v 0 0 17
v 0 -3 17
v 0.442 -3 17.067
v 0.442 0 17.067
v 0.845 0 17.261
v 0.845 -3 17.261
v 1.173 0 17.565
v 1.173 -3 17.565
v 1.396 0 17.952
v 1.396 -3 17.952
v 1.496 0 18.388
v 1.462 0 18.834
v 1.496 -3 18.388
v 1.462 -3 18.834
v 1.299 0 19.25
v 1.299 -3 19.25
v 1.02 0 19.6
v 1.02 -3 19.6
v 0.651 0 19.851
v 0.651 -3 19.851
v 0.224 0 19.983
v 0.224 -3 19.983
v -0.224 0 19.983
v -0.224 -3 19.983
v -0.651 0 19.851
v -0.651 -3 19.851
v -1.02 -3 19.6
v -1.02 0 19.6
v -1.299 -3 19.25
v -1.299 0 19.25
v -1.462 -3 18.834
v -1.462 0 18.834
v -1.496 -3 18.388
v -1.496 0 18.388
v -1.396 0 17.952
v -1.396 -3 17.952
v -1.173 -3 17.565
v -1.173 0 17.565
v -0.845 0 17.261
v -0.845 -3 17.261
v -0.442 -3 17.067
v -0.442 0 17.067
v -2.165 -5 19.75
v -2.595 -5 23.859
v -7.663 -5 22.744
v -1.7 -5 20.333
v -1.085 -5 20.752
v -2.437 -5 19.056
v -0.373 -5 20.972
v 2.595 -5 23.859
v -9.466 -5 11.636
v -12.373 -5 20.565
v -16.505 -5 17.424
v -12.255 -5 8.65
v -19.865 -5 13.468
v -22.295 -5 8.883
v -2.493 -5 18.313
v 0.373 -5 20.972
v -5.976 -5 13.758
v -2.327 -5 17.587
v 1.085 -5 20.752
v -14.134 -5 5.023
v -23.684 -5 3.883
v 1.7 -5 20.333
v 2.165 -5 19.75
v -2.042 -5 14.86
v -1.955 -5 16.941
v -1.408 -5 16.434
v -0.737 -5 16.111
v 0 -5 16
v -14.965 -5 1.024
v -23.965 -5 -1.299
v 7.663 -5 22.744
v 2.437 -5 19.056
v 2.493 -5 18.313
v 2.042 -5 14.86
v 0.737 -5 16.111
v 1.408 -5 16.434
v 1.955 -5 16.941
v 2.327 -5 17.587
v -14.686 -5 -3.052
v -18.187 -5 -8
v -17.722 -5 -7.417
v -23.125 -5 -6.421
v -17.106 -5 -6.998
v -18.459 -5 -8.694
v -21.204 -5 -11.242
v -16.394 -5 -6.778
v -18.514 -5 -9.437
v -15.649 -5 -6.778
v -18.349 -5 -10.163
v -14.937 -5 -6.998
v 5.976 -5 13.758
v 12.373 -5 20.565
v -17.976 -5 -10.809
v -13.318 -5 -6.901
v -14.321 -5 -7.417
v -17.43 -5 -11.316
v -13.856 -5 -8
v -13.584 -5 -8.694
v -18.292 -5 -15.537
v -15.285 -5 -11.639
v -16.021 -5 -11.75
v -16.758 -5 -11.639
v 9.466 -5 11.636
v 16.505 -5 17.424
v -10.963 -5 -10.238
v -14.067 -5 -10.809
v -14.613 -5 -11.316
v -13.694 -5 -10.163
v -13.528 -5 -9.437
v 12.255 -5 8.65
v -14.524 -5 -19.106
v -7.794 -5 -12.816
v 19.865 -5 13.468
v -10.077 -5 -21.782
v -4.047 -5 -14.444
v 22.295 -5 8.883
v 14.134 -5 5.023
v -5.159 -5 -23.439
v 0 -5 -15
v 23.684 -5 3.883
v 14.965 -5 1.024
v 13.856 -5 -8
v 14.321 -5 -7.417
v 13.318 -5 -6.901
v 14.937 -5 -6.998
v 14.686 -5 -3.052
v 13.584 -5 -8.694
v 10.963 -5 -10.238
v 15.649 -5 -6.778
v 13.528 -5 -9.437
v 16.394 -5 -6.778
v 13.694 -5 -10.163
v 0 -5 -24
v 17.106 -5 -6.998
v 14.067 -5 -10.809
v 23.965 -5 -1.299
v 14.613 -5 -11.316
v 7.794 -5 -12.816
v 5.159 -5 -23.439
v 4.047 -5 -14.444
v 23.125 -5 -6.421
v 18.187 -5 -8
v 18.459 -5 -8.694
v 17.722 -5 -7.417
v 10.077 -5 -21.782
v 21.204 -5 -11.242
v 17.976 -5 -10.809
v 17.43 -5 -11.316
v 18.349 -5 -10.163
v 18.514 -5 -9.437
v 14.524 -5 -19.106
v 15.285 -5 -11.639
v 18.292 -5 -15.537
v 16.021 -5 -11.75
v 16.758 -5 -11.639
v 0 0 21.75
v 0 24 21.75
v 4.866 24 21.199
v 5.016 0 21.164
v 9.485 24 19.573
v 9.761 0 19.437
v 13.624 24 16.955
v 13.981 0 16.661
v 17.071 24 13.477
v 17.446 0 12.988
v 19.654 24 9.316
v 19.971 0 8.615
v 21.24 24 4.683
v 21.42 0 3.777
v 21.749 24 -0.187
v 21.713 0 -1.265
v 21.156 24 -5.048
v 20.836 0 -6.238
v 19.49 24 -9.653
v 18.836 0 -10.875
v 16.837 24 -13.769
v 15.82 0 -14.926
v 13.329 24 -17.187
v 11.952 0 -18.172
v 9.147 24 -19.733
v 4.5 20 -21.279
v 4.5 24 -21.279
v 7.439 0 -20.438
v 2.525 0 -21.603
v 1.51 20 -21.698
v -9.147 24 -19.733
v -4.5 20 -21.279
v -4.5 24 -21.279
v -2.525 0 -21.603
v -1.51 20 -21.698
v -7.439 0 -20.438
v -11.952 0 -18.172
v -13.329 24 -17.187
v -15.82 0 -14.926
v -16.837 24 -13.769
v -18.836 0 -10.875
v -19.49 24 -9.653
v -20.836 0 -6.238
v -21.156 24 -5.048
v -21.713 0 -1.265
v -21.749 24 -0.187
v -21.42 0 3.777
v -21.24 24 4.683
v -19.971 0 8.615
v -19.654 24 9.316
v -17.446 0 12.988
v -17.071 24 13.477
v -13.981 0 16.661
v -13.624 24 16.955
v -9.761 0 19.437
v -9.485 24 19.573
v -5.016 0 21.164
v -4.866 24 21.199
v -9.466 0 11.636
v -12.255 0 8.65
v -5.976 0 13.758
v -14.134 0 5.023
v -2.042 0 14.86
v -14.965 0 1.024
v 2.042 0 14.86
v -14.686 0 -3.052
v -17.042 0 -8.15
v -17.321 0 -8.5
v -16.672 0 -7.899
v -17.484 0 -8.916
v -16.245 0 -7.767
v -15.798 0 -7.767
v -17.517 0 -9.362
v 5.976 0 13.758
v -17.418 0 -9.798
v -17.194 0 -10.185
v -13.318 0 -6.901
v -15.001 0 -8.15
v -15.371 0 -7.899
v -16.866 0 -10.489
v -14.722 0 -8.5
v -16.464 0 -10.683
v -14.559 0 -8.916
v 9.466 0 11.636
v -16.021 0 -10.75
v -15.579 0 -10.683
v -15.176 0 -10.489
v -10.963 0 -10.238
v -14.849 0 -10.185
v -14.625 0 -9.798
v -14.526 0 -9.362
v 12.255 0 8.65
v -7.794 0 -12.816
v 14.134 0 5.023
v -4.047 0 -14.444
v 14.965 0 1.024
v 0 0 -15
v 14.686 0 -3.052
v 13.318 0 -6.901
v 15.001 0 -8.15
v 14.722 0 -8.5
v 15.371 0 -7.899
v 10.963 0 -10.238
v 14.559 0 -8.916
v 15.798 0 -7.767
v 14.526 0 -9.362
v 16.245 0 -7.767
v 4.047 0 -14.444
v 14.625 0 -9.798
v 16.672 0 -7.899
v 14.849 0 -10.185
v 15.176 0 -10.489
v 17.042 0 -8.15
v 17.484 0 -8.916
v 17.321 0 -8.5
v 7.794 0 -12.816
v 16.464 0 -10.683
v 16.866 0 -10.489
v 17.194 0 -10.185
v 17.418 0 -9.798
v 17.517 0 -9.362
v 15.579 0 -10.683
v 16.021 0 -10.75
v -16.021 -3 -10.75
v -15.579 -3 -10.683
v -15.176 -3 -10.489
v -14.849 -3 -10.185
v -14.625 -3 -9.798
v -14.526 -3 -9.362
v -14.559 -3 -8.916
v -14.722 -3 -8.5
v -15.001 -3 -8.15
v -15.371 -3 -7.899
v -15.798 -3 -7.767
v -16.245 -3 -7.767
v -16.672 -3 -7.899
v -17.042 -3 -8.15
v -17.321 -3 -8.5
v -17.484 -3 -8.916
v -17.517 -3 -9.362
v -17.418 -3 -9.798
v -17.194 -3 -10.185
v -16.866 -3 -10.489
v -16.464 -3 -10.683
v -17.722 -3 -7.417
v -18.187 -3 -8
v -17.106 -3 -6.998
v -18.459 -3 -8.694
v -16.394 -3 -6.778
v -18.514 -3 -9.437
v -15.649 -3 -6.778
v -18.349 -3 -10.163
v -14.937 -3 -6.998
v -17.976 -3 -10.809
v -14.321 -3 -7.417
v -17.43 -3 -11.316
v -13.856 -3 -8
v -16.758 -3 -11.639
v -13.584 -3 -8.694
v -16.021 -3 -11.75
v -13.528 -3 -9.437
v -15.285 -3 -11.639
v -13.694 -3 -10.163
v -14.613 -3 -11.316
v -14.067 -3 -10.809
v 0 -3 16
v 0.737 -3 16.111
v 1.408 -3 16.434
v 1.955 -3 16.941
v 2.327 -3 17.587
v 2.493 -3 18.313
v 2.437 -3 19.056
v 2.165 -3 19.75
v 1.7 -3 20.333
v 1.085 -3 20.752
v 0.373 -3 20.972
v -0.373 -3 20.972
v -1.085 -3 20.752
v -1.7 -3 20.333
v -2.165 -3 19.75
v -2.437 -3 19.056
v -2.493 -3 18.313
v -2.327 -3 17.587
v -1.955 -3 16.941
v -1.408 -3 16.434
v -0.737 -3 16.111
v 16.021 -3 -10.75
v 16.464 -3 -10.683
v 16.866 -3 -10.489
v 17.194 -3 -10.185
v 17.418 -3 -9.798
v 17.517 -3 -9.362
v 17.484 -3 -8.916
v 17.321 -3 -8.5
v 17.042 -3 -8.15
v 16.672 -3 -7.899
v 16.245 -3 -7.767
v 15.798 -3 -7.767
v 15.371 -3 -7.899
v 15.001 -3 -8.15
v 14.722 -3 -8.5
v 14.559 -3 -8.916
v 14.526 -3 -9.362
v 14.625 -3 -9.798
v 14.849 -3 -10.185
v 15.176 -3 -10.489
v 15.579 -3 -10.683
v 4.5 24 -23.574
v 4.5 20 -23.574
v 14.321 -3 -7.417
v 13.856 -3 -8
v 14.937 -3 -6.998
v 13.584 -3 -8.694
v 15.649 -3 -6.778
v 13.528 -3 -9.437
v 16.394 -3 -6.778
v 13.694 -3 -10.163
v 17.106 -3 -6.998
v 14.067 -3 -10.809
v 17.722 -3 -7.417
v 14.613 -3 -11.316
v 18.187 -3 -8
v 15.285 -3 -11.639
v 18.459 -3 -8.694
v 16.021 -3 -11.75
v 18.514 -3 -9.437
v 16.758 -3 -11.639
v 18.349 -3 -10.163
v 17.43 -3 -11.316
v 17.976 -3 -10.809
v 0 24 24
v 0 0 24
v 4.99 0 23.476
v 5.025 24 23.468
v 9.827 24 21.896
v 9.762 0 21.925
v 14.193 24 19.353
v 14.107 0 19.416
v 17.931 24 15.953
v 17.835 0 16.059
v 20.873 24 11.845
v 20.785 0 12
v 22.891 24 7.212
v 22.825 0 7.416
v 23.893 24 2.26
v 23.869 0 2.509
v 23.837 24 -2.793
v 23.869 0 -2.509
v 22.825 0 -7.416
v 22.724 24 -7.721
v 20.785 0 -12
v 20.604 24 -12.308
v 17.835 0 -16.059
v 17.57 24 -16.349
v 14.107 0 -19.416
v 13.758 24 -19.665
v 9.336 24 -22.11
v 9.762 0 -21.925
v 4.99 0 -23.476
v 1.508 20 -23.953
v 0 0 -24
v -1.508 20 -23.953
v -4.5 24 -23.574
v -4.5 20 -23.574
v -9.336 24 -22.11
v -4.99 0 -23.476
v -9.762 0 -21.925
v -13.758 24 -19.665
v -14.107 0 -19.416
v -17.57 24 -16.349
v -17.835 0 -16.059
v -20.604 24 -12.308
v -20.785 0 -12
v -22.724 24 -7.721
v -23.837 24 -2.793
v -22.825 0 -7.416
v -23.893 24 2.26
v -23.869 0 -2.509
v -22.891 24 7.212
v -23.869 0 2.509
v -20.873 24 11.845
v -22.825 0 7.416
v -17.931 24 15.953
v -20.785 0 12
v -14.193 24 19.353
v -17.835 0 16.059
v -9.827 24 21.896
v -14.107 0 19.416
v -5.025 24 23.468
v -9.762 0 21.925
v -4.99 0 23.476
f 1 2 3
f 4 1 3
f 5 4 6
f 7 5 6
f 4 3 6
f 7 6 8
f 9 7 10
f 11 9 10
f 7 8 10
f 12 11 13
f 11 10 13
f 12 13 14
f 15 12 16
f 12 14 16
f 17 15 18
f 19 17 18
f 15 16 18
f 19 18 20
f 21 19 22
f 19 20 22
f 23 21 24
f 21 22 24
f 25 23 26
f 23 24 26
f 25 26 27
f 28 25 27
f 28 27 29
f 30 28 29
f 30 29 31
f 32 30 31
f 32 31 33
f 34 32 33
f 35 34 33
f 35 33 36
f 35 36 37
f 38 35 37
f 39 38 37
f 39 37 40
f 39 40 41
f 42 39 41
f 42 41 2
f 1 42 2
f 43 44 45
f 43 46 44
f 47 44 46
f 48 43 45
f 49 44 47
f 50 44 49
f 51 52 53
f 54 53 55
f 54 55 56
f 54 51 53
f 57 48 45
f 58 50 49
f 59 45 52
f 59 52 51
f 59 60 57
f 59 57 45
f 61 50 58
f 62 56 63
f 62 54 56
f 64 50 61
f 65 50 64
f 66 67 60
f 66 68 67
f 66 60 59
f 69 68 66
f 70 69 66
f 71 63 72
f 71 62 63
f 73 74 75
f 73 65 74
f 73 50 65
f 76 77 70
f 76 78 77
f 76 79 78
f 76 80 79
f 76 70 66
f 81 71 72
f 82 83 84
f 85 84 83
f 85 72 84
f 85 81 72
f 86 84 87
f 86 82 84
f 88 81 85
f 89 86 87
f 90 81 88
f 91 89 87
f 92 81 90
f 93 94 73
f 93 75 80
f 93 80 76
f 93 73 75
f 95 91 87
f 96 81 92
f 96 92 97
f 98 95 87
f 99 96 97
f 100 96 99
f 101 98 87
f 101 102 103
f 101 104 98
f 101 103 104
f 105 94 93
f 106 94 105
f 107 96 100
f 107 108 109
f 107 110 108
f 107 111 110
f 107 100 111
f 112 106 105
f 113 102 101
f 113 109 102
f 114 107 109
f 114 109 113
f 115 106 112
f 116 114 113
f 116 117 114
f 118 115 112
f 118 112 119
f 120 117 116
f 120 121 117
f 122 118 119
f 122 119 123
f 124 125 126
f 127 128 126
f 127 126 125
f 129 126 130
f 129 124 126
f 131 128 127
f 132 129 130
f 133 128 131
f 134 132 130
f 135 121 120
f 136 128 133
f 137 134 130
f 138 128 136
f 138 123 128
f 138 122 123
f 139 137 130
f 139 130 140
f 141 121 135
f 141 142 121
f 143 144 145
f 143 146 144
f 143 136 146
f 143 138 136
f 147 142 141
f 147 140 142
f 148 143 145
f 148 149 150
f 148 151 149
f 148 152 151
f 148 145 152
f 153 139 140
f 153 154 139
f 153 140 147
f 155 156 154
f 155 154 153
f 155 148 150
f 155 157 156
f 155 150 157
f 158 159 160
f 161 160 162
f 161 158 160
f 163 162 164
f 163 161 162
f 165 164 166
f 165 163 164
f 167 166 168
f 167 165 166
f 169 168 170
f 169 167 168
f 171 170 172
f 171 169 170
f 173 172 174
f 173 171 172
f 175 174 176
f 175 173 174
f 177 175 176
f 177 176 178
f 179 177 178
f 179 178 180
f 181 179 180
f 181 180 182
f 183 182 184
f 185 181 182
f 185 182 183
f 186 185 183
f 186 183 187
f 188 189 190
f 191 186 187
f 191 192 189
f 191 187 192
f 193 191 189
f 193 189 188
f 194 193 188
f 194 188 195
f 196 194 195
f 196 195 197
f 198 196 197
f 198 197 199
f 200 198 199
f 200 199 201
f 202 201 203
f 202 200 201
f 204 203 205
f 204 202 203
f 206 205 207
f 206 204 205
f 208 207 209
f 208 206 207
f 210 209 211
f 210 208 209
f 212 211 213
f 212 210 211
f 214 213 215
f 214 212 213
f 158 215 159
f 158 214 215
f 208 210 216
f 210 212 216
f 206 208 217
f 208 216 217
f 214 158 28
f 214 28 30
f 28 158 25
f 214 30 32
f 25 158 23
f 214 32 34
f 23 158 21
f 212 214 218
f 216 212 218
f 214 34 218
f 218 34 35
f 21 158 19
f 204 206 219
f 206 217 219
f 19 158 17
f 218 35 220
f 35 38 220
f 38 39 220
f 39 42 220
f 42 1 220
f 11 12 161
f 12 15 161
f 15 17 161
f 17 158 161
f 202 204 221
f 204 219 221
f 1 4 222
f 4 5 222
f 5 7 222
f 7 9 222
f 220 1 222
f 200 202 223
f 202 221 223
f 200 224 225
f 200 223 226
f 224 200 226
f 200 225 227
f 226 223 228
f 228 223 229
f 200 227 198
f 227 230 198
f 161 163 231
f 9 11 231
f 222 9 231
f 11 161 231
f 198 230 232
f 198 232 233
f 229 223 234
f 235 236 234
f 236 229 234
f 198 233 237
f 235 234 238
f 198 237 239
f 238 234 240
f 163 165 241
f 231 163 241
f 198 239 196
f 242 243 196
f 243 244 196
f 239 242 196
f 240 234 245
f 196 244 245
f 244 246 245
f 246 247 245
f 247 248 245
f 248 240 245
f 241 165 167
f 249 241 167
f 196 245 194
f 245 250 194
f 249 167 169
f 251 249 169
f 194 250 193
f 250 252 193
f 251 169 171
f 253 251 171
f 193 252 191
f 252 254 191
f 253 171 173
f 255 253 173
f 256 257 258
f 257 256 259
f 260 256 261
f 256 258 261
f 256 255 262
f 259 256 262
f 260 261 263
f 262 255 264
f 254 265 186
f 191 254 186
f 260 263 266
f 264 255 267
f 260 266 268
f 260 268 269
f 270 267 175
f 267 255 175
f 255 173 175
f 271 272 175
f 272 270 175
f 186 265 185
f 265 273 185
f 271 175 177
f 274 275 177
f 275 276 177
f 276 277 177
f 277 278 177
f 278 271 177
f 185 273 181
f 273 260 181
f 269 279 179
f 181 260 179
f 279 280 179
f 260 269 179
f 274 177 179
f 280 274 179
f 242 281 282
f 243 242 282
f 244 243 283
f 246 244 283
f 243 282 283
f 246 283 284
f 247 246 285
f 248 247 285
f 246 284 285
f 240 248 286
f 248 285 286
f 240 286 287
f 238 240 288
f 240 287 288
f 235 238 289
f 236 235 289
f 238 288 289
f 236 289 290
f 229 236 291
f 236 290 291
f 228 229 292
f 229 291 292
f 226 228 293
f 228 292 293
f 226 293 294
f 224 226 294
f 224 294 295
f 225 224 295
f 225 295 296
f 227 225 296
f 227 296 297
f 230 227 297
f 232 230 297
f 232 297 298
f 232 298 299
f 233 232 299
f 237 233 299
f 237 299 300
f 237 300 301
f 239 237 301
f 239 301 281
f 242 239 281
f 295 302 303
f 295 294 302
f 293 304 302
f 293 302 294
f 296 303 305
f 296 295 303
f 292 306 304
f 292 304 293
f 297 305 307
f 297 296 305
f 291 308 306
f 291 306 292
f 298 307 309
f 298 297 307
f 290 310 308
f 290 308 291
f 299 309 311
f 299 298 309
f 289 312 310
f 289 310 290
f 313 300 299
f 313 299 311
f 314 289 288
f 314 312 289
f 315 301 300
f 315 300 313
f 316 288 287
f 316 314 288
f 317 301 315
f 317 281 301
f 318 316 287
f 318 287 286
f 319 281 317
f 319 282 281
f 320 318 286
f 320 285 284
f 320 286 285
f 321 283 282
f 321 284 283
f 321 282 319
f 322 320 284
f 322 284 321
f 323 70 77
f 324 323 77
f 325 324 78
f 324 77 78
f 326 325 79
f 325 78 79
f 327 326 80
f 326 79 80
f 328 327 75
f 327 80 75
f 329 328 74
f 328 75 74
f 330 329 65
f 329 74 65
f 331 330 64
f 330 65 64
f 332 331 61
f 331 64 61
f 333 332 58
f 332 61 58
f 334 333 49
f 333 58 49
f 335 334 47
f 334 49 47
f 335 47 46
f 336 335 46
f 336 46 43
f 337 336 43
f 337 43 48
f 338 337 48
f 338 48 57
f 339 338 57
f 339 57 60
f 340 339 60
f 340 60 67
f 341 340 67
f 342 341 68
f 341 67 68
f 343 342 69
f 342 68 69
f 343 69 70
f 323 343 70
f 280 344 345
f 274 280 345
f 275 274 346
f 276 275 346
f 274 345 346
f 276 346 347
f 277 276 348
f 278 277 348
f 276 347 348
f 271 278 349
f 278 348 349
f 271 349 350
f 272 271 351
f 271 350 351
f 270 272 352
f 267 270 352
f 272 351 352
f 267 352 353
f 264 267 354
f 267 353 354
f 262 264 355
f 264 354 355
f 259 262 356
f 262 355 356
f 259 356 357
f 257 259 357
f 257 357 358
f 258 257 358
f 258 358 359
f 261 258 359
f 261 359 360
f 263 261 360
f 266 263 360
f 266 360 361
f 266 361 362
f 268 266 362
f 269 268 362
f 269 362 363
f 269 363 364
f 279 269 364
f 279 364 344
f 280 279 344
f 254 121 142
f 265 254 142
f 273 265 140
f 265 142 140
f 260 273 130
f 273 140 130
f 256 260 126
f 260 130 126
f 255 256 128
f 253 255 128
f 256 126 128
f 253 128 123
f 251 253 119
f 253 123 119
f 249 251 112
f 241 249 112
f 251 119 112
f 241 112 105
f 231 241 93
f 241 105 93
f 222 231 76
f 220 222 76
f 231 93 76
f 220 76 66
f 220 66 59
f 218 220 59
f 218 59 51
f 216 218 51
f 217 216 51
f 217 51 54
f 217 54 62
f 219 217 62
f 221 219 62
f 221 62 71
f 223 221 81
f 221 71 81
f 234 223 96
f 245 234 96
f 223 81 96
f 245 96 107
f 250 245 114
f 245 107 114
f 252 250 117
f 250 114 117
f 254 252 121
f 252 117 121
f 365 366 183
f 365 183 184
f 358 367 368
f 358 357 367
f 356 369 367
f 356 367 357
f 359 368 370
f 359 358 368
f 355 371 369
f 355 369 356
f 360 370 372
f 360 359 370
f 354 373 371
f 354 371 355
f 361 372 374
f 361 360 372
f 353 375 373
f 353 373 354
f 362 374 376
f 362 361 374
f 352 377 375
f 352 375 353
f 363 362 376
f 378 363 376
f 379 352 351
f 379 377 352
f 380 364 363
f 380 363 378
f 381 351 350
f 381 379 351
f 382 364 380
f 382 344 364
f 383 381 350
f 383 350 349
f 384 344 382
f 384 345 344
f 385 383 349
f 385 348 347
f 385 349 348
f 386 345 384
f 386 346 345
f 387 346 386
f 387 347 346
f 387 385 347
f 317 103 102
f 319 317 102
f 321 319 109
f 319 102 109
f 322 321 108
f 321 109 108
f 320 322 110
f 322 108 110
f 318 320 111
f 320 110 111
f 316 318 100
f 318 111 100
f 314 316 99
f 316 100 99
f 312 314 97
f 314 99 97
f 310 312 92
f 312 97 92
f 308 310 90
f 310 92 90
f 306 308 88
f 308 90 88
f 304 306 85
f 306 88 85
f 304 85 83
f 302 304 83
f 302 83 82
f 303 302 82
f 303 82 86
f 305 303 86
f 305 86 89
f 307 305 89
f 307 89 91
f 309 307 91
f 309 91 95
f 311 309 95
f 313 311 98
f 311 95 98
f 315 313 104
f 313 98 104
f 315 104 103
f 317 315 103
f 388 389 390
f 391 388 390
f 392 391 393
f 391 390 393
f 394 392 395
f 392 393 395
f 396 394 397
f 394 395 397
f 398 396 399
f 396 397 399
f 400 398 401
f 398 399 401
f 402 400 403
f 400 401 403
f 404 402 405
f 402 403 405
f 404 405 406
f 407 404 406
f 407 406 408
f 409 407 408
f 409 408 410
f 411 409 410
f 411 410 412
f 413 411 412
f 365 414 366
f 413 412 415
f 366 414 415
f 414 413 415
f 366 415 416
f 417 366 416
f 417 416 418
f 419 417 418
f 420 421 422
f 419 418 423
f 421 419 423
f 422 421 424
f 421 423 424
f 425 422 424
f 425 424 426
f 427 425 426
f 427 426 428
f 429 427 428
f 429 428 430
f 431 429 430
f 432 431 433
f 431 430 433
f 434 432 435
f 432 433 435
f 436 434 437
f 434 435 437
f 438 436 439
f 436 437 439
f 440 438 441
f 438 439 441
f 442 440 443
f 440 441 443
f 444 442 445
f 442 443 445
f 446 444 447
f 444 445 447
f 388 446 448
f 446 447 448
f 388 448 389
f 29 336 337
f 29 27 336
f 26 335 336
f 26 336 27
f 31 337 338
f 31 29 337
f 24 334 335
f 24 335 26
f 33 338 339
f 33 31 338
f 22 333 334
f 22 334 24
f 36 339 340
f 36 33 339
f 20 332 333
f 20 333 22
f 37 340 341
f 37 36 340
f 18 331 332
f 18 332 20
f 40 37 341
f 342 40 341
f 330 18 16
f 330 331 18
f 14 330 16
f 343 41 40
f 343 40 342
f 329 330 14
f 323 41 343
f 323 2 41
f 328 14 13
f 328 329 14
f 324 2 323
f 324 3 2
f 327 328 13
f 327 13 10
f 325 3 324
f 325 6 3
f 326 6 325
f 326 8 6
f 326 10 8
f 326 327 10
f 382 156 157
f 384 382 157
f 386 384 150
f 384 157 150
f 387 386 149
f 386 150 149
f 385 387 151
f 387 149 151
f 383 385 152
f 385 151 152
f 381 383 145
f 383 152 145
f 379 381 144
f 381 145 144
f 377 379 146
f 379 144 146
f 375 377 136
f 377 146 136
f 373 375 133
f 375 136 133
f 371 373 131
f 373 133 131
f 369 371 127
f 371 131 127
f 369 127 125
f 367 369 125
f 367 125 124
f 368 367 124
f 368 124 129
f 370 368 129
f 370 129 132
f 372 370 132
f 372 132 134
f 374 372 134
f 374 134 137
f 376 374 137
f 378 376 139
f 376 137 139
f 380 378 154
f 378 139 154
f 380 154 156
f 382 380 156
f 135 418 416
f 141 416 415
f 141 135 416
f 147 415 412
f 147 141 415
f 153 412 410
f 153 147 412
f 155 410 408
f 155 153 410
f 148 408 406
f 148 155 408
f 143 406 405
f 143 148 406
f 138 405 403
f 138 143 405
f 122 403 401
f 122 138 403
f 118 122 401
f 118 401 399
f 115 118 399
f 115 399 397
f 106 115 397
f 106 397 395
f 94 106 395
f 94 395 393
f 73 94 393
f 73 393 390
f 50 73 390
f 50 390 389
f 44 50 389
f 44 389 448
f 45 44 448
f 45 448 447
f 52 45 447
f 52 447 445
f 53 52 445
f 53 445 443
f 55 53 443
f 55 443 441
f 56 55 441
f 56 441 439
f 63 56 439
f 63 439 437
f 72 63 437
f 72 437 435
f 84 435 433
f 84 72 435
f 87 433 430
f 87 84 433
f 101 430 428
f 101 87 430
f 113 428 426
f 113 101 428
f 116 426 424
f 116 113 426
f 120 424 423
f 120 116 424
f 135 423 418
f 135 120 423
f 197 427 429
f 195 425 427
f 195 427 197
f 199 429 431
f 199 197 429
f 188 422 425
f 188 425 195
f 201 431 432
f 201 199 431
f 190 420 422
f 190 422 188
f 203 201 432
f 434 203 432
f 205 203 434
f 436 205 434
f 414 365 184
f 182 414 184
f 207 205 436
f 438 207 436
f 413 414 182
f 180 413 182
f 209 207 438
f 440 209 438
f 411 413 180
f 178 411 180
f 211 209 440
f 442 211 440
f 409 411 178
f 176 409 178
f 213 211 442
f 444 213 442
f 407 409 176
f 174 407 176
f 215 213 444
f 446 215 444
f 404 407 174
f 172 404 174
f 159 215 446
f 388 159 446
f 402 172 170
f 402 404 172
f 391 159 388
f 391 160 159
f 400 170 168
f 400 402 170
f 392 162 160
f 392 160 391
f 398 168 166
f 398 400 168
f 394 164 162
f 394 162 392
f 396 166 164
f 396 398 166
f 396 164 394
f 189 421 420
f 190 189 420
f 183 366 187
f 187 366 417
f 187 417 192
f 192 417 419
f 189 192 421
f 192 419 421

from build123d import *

# Parameters (mm, degrees)
SKETCH1_R               = 24
SKETCH1_R_2             = 21.75
BOSS_EXTRUDE1_DEPTH     = 24
BOSS_EXTRUDE2_START     = 5
SKETCH2_R               = 24
SKETCH2_R_2             = 15
BOSS_EXTRUDE2_DEPTH     = 5
SKETCH3_R               = 2.5
CUT_EXTRUDE1_DEPTH      = 2
SKETCH4_R               = 1.5
CUT_EXTRUDE2_DEPTH      = 44.370496884
CUT_EXTRUDE3_REACH      = 60.788
CUT_EXTRUDE3_END_RADIUS = 21.75
SKETCH5_W               = 9
SKETCH5_H               = 4


with BuildPart() as part:
    # Sketch1 → Boss-Extrude1 (new body)
    with BuildSketch(Plane(origin=(0, 0, 0), x_dir=(1, 0, 0), z_dir=(0, 1, 0))):
        with Locations(Location((0, 0, 0), (0, 0, 270))):
            Circle(SKETCH1_R)
        with Locations(Location((0, 0, 0), (0, 0, 270))):
            Circle(SKETCH1_R_2, mode=Mode.SUBTRACT)
    extrude(amount=BOSS_EXTRUDE1_DEPTH)

    # Sketch2 → Boss-Extrude2 (add)
    with BuildSketch(Plane.XZ.offset(BOSS_EXTRUDE2_START)):
        with Locations(Location((0, 0, 0), (0, 0, 270))):
            Circle(SKETCH2_R)
        with Locations(Location((0, 0, 0), (0, 0, 270))):
            Circle(SKETCH2_R_2, mode=Mode.SUBTRACT)
    extrude(amount=-BOSS_EXTRUDE2_DEPTH)

    # Sketch3 → Cut-Extrude1 (cut)
    with BuildSketch(Plane.XZ.offset(5)):
        with Locations(Location((0, 18.5, 0), (0, 0, 270))):
            Circle(SKETCH3_R)
        with Locations(Location((16.02146997, -9.25, 0), (0, 0, 270))):
            Circle(SKETCH3_R)
        with Locations(Location((-16.02146997, -9.25, 0), (0, 0, 270))):
            Circle(SKETCH3_R)
    extrude(amount=-CUT_EXTRUDE1_DEPTH, mode=Mode.SUBTRACT)

    # Sketch4 → Cut-Extrude2 (cut, through all)
    with BuildSketch(Plane.XZ.offset(3)):
        with Locations(Location((0, 18.5, 0), (0, 0, 270))):
            Circle(SKETCH4_R)
        with Locations(Location((16.02146997, -9.25, 0), (0, 0, 270))):
            Circle(SKETCH4_R)
        with Locations(Location((-16.02146997, -9.25, 0), (0, 0, 270))):
            Circle(SKETCH4_R)
    extrude(amount=-CUT_EXTRUDE2_DEPTH, mode=Mode.SUBTRACT)

    # Cut-Extrude3: up to this cylinder (the profile starts outside it)
    cut_extrude3_end = Plane(origin=(0, 22, 0), z_dir=(0, -1, 0)) * Cylinder(CUT_EXTRUDE3_END_RADIUS, 166.076, mode=Mode.PRIVATE)
    # Sketch5 → Cut-Extrude3 (cut, up to the surface)
    with BuildSketch(Plane(origin=(0, 0, -24), x_dir=(-1, 0, 0), z_dir=(0, 0, -1)), mode=Mode.PRIVATE) as cut_extrude3_sk1:
        with Locations((0, 22)):
            Rectangle(SKETCH5_W, SKETCH5_H)
    cut_extrude3_tool1 = extrude(cut_extrude3_sk1.sketch, amount=-CUT_EXTRUDE3_REACH, mode=Mode.PRIVATE) - cut_extrude3_end
    add(cut_extrude3_tool1.solids().sort_by_distance((0, 22, -24))[0], mode=Mode.SUBTRACT)


solid = part.part
